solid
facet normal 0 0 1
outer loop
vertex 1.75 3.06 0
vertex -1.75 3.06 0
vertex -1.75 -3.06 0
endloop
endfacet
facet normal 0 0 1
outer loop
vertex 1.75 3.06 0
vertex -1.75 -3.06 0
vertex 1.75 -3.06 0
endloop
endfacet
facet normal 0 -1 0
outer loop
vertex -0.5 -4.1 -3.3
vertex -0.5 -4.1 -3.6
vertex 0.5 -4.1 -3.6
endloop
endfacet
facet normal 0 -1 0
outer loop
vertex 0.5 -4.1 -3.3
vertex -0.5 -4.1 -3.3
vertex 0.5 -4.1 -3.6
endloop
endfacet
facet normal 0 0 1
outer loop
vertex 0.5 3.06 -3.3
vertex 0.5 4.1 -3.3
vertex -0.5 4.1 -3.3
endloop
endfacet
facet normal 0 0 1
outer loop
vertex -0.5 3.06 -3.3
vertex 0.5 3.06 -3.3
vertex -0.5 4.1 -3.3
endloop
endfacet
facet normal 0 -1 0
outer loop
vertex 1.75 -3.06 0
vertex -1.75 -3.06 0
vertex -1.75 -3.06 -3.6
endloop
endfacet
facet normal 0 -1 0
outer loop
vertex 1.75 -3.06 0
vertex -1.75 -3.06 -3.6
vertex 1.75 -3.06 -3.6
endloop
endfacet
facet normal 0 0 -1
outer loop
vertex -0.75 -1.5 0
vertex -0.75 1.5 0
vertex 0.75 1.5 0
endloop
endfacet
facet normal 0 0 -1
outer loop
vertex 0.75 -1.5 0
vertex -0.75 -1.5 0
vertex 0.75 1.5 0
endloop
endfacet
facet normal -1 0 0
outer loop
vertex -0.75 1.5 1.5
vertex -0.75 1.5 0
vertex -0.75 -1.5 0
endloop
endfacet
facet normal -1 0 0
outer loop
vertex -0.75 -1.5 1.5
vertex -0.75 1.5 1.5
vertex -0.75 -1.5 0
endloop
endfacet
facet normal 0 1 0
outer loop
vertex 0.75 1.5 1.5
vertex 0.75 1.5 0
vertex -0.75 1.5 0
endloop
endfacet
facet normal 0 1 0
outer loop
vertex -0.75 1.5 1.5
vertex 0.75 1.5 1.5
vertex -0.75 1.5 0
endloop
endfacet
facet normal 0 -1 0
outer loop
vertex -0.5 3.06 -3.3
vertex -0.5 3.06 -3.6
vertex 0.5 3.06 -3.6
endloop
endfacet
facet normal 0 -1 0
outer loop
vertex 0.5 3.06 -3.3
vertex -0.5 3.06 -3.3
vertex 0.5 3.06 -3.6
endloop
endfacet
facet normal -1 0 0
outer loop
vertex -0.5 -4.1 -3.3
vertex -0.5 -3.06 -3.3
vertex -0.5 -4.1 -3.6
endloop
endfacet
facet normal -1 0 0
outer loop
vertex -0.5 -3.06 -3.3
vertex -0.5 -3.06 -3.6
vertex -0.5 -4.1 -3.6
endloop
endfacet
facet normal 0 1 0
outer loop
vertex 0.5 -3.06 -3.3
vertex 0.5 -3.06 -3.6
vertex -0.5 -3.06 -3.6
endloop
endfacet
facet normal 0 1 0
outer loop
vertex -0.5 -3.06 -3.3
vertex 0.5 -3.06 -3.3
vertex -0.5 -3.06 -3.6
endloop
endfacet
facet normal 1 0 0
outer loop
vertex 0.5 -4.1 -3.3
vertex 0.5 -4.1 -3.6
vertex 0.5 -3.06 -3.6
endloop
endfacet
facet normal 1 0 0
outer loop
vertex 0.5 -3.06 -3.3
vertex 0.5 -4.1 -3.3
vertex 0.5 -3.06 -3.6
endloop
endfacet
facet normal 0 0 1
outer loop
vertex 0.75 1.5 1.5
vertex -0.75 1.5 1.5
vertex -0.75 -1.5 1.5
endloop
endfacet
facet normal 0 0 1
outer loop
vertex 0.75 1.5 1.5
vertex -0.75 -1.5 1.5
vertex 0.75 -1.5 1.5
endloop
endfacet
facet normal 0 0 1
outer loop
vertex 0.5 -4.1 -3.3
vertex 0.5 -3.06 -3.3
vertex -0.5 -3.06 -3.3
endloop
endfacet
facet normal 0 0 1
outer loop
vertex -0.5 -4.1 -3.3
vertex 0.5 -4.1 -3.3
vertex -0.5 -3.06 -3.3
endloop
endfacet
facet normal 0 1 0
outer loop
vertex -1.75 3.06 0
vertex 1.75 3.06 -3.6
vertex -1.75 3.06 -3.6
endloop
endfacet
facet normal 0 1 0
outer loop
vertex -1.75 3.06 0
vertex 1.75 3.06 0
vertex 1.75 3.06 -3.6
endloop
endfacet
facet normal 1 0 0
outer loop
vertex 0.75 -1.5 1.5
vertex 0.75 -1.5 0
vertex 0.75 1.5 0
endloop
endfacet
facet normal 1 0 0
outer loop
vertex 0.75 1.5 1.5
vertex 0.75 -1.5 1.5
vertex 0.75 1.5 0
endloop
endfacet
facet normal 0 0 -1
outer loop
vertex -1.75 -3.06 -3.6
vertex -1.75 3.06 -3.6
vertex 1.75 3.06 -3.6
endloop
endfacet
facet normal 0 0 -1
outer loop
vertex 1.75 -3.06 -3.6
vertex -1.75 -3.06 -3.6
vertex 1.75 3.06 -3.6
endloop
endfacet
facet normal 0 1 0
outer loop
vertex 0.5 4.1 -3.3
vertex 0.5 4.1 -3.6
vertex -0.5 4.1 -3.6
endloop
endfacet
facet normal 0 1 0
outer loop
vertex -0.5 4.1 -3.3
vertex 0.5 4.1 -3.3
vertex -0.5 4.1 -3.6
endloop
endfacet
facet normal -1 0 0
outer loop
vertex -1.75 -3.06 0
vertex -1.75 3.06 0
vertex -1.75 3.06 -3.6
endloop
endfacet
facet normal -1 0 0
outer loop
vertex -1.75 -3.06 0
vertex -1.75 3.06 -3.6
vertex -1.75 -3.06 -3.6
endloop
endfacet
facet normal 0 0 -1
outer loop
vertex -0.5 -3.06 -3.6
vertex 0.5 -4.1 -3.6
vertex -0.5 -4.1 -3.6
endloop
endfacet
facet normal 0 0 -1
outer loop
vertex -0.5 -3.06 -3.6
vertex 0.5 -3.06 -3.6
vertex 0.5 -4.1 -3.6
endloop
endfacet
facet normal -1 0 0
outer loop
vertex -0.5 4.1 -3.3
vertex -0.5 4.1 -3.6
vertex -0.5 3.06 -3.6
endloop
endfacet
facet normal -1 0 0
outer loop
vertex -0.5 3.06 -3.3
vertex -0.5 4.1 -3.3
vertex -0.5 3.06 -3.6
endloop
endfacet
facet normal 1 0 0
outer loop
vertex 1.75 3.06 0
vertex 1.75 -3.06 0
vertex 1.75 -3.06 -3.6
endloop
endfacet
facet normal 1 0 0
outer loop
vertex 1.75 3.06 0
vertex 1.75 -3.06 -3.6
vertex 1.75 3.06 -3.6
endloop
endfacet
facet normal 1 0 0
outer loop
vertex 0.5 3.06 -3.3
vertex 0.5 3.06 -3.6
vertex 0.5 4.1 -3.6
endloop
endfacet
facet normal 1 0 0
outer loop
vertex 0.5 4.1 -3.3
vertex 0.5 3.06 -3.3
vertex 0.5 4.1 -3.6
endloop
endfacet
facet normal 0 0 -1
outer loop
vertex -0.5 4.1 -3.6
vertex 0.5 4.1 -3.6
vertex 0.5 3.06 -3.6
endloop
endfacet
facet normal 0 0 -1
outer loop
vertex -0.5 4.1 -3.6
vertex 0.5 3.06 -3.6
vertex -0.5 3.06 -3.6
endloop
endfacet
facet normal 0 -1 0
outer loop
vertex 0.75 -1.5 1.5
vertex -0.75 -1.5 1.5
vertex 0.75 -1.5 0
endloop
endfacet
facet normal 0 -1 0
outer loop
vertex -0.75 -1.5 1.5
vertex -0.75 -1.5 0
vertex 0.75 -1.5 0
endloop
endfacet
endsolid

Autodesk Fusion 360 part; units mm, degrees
sketch "Sketch1" plane through (0, 0, 0) normal (0, 0, 1) x (1, 0, 0)
  line L0 (1.75, 3.06) -> (-1.75, 3.06)
  line L1 (-1.75, 3.06) -> (-1.75, -3.06)
  line L2 (-1.75, -3.06) -> (1.75, -3.06)
  line L3 (1.75, -3.06) -> (1.75, 3.06)
  line L4 (1.75, 3.06) -> (-1.75, -3.06) construction
  line L5 (-1.75, 3.06) -> (1.75, -3.06) construction
  line L6 (0.75, 1.5) -> (-0.75, 1.5)
  line L7 (-0.75, 1.5) -> (-0.75, -1.5)
  line L8 (-0.75, -1.5) -> (0.75, -1.5)
  line L9 (0.75, -1.5) -> (0.75, 1.5)
  line L10 (0.75, 1.5) -> (-0.75, -1.5) construction
  line L11 (-0.75, 1.5) -> (0.75, -1.5) construction
  dimension "d1" = 3.5
  dimension "d2" = 6.12
  dimension "d3" = 1.5
  dimension "d4" = 3
extrude "Extrude1" add sketch "Sketch1" along normal blind 1.5 contours L6 L7 L8 L9 makes body 1
extrude "Extrude2" add sketch "Sketch1" against normal blind 3.6 separate body contours L0 L1 L2 L3 | L6 L7 L8 L9 makes body 2
sketch "Sketch2" plane through (0, 0, -3.6) normal (0, 0, -1) x (-1, 0, 0)
  line L0 (-1.75, 3.06) -> (-1.75, -3.06)
  line L1 (-1.75, -3.06) -> (1.75, -3.06)
  line L2 (1.75, -3.06) -> (1.75, 3.06)
  line L3 (1.75, 3.06) -> (-1.75, 3.06)
  line L4 (-0.5, 4.1) -> (0.5, 4.1)
  line L5 (0.5, 4.1) -> (0.5, -4.1)
  line L6 (0.5, -4.1) -> (-0.5, -4.1)
  line L7 (-0.5, -4.1) -> (-0.5, 4.1)
  line L8 (-0.5, 4.1) -> (0.5, -4.1) construction
  line L9 (0.5, 4.1) -> (-0.5, -4.1) construction
  dimension "d9" = 1
  dimension "d10" = 8.2
extrude "Extrude3" add sketch "Sketch2" against normal blind 0.3 separate body contours L3 L4 L5 L7 | L1 L5 L6 L7 makes body 3 at (0.1667, 3.7533, -3.6) makes body 4 at (0.1667, -3.4067, -3.6)
